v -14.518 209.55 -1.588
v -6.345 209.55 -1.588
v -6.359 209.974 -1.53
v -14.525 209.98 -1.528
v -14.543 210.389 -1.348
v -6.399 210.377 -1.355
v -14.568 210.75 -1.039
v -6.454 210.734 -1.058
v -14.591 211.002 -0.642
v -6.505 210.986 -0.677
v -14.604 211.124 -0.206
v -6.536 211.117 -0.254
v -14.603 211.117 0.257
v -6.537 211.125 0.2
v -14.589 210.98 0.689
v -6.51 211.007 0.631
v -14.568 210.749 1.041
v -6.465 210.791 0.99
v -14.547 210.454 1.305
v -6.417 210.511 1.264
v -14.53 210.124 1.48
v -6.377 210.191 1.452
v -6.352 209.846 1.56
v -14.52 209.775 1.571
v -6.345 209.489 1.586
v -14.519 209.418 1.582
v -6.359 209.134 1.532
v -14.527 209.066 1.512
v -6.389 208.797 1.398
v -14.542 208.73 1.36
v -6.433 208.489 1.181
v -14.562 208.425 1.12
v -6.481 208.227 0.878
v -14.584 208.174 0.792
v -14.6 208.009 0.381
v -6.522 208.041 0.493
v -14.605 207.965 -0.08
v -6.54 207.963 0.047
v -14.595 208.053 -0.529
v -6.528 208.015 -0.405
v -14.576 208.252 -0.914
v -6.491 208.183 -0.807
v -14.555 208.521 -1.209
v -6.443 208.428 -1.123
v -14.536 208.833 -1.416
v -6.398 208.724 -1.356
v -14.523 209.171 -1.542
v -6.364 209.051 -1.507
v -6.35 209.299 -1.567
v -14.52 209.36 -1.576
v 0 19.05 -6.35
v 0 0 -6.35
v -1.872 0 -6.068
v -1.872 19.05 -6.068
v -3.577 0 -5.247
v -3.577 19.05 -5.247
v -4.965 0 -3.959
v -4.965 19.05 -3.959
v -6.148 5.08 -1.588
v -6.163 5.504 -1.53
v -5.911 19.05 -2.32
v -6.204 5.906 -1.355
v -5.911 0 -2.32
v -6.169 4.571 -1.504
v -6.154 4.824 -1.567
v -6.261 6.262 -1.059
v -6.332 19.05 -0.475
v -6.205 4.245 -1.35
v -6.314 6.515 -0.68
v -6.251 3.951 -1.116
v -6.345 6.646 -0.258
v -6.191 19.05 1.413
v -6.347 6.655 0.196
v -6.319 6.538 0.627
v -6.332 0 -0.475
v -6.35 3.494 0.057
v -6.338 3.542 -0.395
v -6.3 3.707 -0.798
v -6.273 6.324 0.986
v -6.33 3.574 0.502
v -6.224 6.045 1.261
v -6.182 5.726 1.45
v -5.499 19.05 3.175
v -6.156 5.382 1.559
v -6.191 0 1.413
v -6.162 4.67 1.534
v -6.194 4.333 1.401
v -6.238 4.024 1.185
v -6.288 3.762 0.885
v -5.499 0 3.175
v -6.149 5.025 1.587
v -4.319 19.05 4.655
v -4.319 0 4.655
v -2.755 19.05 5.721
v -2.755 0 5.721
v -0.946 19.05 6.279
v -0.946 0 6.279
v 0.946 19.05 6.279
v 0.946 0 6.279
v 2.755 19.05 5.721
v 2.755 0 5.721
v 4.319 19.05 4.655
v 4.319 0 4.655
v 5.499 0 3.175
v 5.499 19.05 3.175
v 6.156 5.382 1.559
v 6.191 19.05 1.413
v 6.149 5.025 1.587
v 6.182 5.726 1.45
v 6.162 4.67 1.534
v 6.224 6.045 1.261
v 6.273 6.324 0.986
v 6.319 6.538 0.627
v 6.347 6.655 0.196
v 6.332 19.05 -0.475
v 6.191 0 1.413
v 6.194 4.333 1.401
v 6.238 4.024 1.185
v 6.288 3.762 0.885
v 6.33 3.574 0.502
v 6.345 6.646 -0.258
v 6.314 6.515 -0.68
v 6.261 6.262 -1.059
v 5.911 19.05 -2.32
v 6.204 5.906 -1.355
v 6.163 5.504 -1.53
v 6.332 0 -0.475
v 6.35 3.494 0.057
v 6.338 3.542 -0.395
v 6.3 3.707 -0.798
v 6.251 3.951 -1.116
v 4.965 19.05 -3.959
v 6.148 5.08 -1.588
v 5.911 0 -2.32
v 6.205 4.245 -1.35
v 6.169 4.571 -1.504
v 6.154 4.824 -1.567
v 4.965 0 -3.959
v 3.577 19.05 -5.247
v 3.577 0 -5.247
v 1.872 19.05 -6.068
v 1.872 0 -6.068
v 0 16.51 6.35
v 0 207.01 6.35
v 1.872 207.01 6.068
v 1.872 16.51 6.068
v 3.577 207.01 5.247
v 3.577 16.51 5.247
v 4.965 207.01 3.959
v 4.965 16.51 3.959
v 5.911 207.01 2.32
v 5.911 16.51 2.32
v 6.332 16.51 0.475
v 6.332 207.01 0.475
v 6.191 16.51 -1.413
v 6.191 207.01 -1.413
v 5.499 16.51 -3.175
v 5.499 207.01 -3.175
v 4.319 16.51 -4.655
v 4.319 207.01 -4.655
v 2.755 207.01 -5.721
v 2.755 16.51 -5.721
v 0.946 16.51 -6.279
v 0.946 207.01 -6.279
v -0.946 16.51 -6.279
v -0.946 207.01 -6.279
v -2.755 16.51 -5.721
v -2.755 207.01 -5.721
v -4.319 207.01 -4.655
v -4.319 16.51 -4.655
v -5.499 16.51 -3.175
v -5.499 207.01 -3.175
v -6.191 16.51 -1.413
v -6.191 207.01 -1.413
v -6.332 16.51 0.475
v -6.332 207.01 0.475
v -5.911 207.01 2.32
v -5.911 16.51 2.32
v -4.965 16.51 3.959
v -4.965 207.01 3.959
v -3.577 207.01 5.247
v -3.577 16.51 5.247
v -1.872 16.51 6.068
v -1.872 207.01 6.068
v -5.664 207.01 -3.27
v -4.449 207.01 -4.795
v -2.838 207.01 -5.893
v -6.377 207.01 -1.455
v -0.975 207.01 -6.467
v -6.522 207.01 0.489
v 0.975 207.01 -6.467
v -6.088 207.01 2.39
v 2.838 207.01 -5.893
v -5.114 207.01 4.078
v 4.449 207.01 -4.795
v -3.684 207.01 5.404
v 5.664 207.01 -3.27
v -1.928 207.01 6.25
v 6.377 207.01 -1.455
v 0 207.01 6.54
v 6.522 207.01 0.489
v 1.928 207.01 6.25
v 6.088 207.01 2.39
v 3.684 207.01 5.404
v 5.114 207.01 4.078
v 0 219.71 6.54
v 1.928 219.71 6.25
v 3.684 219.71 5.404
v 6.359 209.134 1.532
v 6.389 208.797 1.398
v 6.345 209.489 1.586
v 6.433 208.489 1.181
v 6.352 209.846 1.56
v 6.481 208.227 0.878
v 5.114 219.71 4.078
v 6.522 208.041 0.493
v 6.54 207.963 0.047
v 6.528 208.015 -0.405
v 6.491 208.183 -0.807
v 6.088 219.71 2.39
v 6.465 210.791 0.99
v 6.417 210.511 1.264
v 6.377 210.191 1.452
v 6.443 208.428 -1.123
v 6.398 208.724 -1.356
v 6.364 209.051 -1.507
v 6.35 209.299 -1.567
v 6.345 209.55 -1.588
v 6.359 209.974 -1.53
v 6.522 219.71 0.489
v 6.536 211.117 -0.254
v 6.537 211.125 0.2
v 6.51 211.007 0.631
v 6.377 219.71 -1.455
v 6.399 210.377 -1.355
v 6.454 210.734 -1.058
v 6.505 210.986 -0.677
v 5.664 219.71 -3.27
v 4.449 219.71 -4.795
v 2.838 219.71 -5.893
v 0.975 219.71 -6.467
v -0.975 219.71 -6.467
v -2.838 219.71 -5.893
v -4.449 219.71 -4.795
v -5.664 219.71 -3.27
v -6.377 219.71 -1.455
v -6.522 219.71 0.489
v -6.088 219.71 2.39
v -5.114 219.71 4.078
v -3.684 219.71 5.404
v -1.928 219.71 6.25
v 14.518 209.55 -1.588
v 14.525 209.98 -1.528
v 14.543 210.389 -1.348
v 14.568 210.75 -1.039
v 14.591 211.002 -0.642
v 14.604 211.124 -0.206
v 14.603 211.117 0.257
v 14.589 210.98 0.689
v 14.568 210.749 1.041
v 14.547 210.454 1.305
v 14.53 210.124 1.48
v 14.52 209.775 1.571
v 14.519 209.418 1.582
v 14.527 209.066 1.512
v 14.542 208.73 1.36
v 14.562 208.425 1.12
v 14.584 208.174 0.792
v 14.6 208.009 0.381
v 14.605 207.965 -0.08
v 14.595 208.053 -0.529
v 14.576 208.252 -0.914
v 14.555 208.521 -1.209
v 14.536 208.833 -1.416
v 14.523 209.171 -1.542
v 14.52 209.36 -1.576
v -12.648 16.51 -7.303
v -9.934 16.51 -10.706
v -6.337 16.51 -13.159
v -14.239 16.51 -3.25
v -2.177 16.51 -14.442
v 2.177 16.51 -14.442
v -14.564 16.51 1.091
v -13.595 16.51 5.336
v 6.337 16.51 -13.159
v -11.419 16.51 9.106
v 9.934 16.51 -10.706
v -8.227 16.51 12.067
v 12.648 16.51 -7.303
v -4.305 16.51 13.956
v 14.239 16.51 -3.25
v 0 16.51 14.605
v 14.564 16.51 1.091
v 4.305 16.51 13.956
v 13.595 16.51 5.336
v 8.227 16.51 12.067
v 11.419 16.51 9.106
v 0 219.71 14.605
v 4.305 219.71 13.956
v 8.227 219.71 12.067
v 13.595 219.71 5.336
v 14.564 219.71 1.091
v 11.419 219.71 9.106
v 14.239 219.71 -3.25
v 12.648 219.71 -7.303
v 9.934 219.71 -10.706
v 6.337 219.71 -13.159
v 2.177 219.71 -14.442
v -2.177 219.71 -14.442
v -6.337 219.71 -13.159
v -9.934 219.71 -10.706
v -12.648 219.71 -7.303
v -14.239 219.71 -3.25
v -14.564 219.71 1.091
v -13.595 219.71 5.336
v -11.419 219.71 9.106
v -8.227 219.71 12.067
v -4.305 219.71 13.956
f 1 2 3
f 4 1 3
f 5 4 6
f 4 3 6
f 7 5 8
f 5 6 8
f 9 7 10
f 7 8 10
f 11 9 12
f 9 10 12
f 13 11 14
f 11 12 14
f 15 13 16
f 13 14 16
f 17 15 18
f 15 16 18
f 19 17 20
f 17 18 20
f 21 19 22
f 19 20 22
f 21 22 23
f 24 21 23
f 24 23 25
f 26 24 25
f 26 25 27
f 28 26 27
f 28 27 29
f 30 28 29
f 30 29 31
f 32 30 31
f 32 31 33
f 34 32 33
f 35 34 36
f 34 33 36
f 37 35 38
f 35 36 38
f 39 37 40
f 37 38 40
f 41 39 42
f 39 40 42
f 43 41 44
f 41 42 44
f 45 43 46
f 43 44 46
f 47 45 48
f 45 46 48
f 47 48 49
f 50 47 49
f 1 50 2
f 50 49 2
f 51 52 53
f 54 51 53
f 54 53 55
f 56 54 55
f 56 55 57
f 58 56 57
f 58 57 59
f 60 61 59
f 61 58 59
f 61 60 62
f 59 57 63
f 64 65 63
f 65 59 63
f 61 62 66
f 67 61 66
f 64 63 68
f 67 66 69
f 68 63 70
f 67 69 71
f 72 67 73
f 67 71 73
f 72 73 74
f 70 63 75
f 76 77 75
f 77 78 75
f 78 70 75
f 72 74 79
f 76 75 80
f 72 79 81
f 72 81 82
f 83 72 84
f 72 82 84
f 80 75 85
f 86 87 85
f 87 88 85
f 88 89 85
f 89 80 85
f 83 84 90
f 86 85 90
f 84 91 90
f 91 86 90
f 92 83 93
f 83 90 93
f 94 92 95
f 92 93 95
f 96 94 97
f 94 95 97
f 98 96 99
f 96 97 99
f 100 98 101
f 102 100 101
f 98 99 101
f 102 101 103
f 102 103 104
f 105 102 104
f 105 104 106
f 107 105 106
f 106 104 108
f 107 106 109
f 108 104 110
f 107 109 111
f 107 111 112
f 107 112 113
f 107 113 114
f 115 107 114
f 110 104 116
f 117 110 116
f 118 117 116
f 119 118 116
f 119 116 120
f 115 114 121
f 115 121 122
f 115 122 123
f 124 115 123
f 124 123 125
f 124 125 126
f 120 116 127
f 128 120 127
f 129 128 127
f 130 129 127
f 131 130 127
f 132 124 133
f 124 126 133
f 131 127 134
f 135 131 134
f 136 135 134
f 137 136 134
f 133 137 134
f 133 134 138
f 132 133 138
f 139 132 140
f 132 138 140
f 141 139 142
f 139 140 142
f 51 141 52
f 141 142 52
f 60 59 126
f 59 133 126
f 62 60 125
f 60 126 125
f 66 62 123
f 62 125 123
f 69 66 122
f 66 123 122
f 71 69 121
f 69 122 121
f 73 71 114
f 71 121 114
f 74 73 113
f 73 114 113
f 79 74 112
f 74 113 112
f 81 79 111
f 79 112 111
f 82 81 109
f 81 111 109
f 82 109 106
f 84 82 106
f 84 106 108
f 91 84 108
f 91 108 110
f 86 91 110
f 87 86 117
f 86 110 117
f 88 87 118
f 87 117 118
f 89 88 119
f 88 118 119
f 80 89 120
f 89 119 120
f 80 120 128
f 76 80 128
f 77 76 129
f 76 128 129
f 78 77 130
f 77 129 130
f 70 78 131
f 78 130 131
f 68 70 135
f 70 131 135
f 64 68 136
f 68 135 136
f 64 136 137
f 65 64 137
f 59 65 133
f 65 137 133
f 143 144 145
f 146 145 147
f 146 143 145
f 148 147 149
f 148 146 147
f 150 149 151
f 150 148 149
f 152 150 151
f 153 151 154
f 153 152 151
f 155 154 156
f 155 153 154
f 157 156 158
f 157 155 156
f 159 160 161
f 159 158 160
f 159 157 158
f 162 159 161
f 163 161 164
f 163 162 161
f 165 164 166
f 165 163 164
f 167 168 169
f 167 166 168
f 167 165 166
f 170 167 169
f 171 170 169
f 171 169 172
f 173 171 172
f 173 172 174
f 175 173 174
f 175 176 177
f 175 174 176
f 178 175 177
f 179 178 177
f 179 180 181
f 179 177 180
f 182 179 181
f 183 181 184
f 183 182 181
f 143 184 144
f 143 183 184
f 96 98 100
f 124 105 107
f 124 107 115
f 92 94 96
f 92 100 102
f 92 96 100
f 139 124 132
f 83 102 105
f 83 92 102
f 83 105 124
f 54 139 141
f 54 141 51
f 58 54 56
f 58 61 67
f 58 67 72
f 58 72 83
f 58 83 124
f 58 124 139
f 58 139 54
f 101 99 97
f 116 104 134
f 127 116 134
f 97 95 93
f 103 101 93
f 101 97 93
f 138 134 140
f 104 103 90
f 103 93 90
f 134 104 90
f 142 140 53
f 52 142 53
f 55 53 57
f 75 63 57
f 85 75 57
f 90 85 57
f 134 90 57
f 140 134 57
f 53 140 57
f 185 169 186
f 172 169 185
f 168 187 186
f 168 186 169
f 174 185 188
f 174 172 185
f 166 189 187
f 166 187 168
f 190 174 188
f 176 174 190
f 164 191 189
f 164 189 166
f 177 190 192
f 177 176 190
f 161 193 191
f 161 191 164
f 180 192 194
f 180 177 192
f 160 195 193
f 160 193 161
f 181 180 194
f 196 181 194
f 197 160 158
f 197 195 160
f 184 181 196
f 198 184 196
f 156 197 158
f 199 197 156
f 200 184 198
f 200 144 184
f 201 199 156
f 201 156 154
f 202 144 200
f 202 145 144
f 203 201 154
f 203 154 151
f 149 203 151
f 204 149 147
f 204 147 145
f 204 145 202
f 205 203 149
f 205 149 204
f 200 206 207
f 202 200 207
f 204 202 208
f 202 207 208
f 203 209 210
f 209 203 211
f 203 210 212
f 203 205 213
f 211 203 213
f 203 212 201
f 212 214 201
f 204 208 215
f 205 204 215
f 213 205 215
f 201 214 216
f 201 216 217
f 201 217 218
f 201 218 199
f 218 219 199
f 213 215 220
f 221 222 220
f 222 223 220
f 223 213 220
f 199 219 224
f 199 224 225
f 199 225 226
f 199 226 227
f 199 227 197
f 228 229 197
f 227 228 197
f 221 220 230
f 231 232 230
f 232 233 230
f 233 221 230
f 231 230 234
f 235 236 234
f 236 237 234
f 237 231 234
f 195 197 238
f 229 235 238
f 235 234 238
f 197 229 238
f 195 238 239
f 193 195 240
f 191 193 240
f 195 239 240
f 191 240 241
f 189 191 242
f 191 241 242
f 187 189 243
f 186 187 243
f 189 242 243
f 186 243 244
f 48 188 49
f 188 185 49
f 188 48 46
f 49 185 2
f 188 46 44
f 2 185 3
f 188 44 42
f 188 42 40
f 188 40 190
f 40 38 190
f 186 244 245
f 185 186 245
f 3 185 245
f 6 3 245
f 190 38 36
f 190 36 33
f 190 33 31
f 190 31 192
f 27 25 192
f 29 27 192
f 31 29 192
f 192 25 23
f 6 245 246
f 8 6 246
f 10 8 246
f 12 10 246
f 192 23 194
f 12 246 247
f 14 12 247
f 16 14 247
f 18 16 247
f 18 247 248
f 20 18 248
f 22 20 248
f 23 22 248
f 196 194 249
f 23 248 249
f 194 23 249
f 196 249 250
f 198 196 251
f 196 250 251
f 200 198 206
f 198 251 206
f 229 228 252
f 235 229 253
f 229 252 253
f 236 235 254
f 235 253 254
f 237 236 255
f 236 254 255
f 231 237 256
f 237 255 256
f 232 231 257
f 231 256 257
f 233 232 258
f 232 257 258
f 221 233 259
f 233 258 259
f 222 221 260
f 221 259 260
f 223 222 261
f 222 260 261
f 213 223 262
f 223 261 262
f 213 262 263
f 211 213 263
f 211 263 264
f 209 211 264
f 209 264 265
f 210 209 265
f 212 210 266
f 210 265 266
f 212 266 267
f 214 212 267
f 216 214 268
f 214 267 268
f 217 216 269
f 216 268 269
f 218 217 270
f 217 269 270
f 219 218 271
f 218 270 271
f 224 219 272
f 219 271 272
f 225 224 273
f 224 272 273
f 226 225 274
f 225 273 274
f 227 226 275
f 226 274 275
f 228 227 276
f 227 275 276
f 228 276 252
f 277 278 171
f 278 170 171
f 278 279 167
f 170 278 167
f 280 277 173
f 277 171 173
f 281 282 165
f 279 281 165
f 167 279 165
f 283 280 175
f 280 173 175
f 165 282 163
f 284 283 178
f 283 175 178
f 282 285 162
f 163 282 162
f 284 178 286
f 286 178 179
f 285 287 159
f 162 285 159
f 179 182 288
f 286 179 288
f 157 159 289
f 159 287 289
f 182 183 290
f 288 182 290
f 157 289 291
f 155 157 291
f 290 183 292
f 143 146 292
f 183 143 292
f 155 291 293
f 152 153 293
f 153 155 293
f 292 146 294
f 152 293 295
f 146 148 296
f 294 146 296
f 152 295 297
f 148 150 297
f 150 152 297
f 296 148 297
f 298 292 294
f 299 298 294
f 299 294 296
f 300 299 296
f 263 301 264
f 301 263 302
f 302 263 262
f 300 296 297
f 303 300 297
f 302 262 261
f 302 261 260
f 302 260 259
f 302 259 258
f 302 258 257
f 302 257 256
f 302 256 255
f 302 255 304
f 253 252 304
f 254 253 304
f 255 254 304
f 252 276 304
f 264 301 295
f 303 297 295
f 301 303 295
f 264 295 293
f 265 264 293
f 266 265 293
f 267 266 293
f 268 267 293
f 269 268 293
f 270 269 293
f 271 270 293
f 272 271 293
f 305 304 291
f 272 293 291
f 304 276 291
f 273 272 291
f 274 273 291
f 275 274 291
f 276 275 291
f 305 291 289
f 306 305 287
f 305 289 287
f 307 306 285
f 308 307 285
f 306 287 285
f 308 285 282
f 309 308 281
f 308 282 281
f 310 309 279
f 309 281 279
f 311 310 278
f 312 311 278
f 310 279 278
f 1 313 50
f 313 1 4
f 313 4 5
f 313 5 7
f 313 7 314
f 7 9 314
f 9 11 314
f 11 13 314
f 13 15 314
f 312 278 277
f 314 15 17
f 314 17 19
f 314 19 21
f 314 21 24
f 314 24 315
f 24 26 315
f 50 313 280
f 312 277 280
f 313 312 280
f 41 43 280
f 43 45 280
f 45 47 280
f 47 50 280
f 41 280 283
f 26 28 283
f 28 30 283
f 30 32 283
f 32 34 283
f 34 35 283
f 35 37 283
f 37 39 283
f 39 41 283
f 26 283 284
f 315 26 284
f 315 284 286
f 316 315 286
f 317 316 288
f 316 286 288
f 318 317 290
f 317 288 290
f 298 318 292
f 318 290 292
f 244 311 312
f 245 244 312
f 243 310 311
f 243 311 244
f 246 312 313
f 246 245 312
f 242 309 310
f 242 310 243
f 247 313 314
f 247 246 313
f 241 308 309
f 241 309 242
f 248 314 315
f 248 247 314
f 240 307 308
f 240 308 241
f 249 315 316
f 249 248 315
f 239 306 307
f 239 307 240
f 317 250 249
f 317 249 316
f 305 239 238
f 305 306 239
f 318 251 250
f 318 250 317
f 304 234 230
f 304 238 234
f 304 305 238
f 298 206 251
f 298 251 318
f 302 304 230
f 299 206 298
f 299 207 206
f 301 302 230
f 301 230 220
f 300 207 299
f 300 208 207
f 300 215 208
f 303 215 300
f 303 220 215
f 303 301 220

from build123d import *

# Parameters (mm, degrees)
SKETCH1_R           = 6.35
BOSS_EXTRUDE1_DEPTH = 19.05
SKETCH2_R           = 1.5875
CUT_EXTRUDE1_DEPTH  = 25.4
SKETCH4_R           = 14.605
SKETCH4_R_2         = 6.35
BOSS_EXTRUDE3_DEPTH = 203.2
SKETCH5_R           = 1.5875
CUT_EXTRUDE2_DEPTH  = 63.5
SKETCH6_R           = 6.5405
CUT_EXTRUDE3_DEPTH  = 12.7


with BuildPart() as part:
    # Sketch1 → Boss-Extrude1 (new body)
    with BuildSketch(Plane(origin=(0, 0, 0), x_dir=(1, 0, 0), z_dir=(0, 1, 0))):
        with Locations(Location((0, 0, 0), (0, 0, 90))):
            Circle(SKETCH1_R)
    extrude(amount=BOSS_EXTRUDE1_DEPTH)

    # Sketch2 → Cut-Extrude1 (cut, symmetric)
    with BuildSketch(Plane(origin=(0, 0, 0), x_dir=(0, 0, -1), z_dir=(1, 0, 0))):
        with Locations((0, 5.08)):
            Circle(SKETCH2_R)
    extrude(amount=CUT_EXTRUDE1_DEPTH, both=True, mode=Mode.SUBTRACT)


with BuildPart() as body_2:
    # Sketch4 → Boss-Extrude3 (new body)
    with BuildSketch(Plane(origin=(0, 16.51, 0), x_dir=(1, 0, 0), z_dir=(0, 1, 0))):
        with Locations(Location((0, 0, 0), (0, 0, 270))):
            Circle(SKETCH4_R)
        with Locations(Location((0, 0, 0), (0, 0, 270))):
            Circle(SKETCH4_R_2, mode=Mode.SUBTRACT)
    extrude(amount=BOSS_EXTRUDE3_DEPTH)

    # Sketch5 → Cut-Extrude2 (cut, symmetric)
    with BuildSketch(Plane(origin=(0, 0, 0), x_dir=(0, 0, -1), z_dir=(1, 0, 0))):
        with Locations((0, 209.55)):
            Circle(SKETCH5_R)
    extrude(amount=CUT_EXTRUDE2_DEPTH, both=True, mode=Mode.SUBTRACT)

    # Sketch6 → Cut-Extrude3 (cut, symmetric)
    with BuildSketch(Plane(origin=(0, 219.71, 0), x_dir=(1, 0, 0), z_dir=(0, 1, 0))):
        with Locations(Location((0, 0, 0), (0, 0, 270))):
            Circle(SKETCH6_R)
    extrude(amount=CUT_EXTRUDE3_DEPTH, both=True, mode=Mode.SUBTRACT)


solid = Compound([part.part, body_2.part])
